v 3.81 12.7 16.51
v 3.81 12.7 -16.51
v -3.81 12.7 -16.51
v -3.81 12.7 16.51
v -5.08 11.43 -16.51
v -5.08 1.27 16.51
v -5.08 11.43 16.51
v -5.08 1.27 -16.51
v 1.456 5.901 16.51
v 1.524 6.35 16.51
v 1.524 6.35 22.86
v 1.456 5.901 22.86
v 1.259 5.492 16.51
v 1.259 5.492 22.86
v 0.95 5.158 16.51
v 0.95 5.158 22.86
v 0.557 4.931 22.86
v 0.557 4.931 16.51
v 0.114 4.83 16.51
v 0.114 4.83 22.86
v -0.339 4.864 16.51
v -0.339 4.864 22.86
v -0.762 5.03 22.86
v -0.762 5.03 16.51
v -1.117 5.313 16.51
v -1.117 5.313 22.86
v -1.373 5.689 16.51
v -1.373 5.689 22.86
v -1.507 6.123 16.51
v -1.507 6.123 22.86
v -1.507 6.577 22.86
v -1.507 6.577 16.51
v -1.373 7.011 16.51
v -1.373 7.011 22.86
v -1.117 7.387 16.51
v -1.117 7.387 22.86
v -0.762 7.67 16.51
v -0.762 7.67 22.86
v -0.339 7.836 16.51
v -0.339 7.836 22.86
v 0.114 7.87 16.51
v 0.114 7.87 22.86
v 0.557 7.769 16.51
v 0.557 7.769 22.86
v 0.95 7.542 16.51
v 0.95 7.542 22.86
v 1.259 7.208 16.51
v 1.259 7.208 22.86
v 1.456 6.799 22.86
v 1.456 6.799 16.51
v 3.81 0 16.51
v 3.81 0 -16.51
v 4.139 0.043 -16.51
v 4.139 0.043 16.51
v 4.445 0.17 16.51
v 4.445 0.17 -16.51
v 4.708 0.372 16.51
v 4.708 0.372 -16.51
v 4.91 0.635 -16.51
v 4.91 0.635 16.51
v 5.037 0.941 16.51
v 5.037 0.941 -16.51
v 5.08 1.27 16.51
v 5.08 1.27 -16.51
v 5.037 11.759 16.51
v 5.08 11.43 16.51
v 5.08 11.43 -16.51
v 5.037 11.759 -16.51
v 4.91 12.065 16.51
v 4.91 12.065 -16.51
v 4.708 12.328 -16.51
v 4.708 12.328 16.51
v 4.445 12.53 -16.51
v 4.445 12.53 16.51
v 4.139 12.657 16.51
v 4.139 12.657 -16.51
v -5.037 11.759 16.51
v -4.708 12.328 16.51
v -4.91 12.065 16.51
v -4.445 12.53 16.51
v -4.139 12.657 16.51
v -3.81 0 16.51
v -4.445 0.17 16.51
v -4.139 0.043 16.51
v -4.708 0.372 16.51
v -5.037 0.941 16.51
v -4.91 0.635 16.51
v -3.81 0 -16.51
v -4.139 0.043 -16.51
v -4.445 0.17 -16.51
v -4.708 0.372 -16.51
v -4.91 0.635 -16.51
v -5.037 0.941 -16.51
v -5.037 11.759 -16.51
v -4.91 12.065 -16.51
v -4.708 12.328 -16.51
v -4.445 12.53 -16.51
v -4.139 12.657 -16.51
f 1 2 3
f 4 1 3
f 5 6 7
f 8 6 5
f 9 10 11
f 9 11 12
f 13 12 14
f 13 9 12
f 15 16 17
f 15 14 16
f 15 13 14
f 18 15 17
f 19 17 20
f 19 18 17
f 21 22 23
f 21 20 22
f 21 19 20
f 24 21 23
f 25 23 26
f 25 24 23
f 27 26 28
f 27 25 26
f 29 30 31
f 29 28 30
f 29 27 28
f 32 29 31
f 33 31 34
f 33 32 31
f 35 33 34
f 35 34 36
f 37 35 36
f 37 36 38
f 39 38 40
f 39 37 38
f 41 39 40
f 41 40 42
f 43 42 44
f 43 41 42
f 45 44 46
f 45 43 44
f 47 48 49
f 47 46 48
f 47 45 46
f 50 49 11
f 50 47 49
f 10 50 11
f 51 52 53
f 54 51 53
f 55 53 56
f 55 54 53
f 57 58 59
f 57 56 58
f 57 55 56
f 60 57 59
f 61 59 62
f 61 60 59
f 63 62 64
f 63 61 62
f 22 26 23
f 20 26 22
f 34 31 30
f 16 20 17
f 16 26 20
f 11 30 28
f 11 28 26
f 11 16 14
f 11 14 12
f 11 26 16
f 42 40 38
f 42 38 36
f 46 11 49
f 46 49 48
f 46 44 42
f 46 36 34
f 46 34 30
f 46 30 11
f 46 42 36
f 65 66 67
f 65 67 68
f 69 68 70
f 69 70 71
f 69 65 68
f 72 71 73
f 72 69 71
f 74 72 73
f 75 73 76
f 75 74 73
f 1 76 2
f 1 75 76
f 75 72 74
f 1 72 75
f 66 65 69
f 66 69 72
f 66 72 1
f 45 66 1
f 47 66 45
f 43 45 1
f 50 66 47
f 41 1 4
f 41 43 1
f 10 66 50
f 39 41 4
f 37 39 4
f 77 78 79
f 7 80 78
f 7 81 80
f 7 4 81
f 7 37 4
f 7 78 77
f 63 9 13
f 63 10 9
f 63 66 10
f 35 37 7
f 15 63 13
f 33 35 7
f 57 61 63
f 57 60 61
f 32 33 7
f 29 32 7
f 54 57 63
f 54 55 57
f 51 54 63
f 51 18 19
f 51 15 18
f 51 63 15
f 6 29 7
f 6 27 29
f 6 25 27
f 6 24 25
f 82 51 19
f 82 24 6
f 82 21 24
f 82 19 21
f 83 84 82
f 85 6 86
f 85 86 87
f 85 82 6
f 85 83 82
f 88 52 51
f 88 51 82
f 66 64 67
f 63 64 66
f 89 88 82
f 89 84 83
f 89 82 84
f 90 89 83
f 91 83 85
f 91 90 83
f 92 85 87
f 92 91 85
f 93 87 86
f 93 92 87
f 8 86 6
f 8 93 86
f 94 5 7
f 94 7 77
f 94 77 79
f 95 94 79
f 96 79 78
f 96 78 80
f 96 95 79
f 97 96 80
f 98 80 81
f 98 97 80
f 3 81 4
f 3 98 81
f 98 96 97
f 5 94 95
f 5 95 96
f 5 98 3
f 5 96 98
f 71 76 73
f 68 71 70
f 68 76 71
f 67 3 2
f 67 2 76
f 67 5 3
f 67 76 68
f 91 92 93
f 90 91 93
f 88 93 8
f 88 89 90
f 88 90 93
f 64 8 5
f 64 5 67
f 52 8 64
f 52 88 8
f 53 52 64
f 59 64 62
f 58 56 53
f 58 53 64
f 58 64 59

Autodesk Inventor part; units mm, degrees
ref_plane "YZ Plane" through (0, 0, 0) normal (1, 0, 0) x (0, 1, 0)
ref_plane "XZ Plane" through (0, 0, 0) normal (0, 1, 0) x (-1, 0, 0)
ref_plane "XY Plane" through (0, 0, 0) normal (0, 0, 1) x (1, 0, 0)
sketch "Sketch1" plane through (0, 0, 0) normal (0, 1, 0) x (-1, 0, 0)
  line L0 (-5.08, 16.51) -> (5.08, 16.51)
  line L1 (5.08, 16.51) -> (5.08, -16.51)
  line L2 (5.08, -16.51) -> (-5.08, -16.51)
  line L3 (-5.08, -16.51) -> (-5.08, 16.51)
  line L4 (-5.08, 16.51) -> (5.08, -16.51) construction
  line L5 (5.08, 16.51) -> (-5.08, -16.51) construction
  point P0 (0, 0)
  dimension "d0" = 10.16
  dimension "d1" = 33.02
extrude "Extrusion1" add sketch "Sketch1" along normal blind 12.7
fillet "Fillet1" radius 1.27 4 edges at (5.08, 12.7, 0) (5.08, 0, 0) (-5.08, 12.7, 0) (-5.08, 0, 0)
sketch "Sketch2" plane through (-3.81, 0, 16.51) normal (0, 0, 1) x (1, 0, 0)
  circle A0 centre (3.81, 6.35) radius 1.524
  point P0 (3.81, 0)
  dimension "d5" = 3.048
extrude "Extrusion2" add sketch "Sketch2" along normal blind 6.35
properties part number "mtr"
